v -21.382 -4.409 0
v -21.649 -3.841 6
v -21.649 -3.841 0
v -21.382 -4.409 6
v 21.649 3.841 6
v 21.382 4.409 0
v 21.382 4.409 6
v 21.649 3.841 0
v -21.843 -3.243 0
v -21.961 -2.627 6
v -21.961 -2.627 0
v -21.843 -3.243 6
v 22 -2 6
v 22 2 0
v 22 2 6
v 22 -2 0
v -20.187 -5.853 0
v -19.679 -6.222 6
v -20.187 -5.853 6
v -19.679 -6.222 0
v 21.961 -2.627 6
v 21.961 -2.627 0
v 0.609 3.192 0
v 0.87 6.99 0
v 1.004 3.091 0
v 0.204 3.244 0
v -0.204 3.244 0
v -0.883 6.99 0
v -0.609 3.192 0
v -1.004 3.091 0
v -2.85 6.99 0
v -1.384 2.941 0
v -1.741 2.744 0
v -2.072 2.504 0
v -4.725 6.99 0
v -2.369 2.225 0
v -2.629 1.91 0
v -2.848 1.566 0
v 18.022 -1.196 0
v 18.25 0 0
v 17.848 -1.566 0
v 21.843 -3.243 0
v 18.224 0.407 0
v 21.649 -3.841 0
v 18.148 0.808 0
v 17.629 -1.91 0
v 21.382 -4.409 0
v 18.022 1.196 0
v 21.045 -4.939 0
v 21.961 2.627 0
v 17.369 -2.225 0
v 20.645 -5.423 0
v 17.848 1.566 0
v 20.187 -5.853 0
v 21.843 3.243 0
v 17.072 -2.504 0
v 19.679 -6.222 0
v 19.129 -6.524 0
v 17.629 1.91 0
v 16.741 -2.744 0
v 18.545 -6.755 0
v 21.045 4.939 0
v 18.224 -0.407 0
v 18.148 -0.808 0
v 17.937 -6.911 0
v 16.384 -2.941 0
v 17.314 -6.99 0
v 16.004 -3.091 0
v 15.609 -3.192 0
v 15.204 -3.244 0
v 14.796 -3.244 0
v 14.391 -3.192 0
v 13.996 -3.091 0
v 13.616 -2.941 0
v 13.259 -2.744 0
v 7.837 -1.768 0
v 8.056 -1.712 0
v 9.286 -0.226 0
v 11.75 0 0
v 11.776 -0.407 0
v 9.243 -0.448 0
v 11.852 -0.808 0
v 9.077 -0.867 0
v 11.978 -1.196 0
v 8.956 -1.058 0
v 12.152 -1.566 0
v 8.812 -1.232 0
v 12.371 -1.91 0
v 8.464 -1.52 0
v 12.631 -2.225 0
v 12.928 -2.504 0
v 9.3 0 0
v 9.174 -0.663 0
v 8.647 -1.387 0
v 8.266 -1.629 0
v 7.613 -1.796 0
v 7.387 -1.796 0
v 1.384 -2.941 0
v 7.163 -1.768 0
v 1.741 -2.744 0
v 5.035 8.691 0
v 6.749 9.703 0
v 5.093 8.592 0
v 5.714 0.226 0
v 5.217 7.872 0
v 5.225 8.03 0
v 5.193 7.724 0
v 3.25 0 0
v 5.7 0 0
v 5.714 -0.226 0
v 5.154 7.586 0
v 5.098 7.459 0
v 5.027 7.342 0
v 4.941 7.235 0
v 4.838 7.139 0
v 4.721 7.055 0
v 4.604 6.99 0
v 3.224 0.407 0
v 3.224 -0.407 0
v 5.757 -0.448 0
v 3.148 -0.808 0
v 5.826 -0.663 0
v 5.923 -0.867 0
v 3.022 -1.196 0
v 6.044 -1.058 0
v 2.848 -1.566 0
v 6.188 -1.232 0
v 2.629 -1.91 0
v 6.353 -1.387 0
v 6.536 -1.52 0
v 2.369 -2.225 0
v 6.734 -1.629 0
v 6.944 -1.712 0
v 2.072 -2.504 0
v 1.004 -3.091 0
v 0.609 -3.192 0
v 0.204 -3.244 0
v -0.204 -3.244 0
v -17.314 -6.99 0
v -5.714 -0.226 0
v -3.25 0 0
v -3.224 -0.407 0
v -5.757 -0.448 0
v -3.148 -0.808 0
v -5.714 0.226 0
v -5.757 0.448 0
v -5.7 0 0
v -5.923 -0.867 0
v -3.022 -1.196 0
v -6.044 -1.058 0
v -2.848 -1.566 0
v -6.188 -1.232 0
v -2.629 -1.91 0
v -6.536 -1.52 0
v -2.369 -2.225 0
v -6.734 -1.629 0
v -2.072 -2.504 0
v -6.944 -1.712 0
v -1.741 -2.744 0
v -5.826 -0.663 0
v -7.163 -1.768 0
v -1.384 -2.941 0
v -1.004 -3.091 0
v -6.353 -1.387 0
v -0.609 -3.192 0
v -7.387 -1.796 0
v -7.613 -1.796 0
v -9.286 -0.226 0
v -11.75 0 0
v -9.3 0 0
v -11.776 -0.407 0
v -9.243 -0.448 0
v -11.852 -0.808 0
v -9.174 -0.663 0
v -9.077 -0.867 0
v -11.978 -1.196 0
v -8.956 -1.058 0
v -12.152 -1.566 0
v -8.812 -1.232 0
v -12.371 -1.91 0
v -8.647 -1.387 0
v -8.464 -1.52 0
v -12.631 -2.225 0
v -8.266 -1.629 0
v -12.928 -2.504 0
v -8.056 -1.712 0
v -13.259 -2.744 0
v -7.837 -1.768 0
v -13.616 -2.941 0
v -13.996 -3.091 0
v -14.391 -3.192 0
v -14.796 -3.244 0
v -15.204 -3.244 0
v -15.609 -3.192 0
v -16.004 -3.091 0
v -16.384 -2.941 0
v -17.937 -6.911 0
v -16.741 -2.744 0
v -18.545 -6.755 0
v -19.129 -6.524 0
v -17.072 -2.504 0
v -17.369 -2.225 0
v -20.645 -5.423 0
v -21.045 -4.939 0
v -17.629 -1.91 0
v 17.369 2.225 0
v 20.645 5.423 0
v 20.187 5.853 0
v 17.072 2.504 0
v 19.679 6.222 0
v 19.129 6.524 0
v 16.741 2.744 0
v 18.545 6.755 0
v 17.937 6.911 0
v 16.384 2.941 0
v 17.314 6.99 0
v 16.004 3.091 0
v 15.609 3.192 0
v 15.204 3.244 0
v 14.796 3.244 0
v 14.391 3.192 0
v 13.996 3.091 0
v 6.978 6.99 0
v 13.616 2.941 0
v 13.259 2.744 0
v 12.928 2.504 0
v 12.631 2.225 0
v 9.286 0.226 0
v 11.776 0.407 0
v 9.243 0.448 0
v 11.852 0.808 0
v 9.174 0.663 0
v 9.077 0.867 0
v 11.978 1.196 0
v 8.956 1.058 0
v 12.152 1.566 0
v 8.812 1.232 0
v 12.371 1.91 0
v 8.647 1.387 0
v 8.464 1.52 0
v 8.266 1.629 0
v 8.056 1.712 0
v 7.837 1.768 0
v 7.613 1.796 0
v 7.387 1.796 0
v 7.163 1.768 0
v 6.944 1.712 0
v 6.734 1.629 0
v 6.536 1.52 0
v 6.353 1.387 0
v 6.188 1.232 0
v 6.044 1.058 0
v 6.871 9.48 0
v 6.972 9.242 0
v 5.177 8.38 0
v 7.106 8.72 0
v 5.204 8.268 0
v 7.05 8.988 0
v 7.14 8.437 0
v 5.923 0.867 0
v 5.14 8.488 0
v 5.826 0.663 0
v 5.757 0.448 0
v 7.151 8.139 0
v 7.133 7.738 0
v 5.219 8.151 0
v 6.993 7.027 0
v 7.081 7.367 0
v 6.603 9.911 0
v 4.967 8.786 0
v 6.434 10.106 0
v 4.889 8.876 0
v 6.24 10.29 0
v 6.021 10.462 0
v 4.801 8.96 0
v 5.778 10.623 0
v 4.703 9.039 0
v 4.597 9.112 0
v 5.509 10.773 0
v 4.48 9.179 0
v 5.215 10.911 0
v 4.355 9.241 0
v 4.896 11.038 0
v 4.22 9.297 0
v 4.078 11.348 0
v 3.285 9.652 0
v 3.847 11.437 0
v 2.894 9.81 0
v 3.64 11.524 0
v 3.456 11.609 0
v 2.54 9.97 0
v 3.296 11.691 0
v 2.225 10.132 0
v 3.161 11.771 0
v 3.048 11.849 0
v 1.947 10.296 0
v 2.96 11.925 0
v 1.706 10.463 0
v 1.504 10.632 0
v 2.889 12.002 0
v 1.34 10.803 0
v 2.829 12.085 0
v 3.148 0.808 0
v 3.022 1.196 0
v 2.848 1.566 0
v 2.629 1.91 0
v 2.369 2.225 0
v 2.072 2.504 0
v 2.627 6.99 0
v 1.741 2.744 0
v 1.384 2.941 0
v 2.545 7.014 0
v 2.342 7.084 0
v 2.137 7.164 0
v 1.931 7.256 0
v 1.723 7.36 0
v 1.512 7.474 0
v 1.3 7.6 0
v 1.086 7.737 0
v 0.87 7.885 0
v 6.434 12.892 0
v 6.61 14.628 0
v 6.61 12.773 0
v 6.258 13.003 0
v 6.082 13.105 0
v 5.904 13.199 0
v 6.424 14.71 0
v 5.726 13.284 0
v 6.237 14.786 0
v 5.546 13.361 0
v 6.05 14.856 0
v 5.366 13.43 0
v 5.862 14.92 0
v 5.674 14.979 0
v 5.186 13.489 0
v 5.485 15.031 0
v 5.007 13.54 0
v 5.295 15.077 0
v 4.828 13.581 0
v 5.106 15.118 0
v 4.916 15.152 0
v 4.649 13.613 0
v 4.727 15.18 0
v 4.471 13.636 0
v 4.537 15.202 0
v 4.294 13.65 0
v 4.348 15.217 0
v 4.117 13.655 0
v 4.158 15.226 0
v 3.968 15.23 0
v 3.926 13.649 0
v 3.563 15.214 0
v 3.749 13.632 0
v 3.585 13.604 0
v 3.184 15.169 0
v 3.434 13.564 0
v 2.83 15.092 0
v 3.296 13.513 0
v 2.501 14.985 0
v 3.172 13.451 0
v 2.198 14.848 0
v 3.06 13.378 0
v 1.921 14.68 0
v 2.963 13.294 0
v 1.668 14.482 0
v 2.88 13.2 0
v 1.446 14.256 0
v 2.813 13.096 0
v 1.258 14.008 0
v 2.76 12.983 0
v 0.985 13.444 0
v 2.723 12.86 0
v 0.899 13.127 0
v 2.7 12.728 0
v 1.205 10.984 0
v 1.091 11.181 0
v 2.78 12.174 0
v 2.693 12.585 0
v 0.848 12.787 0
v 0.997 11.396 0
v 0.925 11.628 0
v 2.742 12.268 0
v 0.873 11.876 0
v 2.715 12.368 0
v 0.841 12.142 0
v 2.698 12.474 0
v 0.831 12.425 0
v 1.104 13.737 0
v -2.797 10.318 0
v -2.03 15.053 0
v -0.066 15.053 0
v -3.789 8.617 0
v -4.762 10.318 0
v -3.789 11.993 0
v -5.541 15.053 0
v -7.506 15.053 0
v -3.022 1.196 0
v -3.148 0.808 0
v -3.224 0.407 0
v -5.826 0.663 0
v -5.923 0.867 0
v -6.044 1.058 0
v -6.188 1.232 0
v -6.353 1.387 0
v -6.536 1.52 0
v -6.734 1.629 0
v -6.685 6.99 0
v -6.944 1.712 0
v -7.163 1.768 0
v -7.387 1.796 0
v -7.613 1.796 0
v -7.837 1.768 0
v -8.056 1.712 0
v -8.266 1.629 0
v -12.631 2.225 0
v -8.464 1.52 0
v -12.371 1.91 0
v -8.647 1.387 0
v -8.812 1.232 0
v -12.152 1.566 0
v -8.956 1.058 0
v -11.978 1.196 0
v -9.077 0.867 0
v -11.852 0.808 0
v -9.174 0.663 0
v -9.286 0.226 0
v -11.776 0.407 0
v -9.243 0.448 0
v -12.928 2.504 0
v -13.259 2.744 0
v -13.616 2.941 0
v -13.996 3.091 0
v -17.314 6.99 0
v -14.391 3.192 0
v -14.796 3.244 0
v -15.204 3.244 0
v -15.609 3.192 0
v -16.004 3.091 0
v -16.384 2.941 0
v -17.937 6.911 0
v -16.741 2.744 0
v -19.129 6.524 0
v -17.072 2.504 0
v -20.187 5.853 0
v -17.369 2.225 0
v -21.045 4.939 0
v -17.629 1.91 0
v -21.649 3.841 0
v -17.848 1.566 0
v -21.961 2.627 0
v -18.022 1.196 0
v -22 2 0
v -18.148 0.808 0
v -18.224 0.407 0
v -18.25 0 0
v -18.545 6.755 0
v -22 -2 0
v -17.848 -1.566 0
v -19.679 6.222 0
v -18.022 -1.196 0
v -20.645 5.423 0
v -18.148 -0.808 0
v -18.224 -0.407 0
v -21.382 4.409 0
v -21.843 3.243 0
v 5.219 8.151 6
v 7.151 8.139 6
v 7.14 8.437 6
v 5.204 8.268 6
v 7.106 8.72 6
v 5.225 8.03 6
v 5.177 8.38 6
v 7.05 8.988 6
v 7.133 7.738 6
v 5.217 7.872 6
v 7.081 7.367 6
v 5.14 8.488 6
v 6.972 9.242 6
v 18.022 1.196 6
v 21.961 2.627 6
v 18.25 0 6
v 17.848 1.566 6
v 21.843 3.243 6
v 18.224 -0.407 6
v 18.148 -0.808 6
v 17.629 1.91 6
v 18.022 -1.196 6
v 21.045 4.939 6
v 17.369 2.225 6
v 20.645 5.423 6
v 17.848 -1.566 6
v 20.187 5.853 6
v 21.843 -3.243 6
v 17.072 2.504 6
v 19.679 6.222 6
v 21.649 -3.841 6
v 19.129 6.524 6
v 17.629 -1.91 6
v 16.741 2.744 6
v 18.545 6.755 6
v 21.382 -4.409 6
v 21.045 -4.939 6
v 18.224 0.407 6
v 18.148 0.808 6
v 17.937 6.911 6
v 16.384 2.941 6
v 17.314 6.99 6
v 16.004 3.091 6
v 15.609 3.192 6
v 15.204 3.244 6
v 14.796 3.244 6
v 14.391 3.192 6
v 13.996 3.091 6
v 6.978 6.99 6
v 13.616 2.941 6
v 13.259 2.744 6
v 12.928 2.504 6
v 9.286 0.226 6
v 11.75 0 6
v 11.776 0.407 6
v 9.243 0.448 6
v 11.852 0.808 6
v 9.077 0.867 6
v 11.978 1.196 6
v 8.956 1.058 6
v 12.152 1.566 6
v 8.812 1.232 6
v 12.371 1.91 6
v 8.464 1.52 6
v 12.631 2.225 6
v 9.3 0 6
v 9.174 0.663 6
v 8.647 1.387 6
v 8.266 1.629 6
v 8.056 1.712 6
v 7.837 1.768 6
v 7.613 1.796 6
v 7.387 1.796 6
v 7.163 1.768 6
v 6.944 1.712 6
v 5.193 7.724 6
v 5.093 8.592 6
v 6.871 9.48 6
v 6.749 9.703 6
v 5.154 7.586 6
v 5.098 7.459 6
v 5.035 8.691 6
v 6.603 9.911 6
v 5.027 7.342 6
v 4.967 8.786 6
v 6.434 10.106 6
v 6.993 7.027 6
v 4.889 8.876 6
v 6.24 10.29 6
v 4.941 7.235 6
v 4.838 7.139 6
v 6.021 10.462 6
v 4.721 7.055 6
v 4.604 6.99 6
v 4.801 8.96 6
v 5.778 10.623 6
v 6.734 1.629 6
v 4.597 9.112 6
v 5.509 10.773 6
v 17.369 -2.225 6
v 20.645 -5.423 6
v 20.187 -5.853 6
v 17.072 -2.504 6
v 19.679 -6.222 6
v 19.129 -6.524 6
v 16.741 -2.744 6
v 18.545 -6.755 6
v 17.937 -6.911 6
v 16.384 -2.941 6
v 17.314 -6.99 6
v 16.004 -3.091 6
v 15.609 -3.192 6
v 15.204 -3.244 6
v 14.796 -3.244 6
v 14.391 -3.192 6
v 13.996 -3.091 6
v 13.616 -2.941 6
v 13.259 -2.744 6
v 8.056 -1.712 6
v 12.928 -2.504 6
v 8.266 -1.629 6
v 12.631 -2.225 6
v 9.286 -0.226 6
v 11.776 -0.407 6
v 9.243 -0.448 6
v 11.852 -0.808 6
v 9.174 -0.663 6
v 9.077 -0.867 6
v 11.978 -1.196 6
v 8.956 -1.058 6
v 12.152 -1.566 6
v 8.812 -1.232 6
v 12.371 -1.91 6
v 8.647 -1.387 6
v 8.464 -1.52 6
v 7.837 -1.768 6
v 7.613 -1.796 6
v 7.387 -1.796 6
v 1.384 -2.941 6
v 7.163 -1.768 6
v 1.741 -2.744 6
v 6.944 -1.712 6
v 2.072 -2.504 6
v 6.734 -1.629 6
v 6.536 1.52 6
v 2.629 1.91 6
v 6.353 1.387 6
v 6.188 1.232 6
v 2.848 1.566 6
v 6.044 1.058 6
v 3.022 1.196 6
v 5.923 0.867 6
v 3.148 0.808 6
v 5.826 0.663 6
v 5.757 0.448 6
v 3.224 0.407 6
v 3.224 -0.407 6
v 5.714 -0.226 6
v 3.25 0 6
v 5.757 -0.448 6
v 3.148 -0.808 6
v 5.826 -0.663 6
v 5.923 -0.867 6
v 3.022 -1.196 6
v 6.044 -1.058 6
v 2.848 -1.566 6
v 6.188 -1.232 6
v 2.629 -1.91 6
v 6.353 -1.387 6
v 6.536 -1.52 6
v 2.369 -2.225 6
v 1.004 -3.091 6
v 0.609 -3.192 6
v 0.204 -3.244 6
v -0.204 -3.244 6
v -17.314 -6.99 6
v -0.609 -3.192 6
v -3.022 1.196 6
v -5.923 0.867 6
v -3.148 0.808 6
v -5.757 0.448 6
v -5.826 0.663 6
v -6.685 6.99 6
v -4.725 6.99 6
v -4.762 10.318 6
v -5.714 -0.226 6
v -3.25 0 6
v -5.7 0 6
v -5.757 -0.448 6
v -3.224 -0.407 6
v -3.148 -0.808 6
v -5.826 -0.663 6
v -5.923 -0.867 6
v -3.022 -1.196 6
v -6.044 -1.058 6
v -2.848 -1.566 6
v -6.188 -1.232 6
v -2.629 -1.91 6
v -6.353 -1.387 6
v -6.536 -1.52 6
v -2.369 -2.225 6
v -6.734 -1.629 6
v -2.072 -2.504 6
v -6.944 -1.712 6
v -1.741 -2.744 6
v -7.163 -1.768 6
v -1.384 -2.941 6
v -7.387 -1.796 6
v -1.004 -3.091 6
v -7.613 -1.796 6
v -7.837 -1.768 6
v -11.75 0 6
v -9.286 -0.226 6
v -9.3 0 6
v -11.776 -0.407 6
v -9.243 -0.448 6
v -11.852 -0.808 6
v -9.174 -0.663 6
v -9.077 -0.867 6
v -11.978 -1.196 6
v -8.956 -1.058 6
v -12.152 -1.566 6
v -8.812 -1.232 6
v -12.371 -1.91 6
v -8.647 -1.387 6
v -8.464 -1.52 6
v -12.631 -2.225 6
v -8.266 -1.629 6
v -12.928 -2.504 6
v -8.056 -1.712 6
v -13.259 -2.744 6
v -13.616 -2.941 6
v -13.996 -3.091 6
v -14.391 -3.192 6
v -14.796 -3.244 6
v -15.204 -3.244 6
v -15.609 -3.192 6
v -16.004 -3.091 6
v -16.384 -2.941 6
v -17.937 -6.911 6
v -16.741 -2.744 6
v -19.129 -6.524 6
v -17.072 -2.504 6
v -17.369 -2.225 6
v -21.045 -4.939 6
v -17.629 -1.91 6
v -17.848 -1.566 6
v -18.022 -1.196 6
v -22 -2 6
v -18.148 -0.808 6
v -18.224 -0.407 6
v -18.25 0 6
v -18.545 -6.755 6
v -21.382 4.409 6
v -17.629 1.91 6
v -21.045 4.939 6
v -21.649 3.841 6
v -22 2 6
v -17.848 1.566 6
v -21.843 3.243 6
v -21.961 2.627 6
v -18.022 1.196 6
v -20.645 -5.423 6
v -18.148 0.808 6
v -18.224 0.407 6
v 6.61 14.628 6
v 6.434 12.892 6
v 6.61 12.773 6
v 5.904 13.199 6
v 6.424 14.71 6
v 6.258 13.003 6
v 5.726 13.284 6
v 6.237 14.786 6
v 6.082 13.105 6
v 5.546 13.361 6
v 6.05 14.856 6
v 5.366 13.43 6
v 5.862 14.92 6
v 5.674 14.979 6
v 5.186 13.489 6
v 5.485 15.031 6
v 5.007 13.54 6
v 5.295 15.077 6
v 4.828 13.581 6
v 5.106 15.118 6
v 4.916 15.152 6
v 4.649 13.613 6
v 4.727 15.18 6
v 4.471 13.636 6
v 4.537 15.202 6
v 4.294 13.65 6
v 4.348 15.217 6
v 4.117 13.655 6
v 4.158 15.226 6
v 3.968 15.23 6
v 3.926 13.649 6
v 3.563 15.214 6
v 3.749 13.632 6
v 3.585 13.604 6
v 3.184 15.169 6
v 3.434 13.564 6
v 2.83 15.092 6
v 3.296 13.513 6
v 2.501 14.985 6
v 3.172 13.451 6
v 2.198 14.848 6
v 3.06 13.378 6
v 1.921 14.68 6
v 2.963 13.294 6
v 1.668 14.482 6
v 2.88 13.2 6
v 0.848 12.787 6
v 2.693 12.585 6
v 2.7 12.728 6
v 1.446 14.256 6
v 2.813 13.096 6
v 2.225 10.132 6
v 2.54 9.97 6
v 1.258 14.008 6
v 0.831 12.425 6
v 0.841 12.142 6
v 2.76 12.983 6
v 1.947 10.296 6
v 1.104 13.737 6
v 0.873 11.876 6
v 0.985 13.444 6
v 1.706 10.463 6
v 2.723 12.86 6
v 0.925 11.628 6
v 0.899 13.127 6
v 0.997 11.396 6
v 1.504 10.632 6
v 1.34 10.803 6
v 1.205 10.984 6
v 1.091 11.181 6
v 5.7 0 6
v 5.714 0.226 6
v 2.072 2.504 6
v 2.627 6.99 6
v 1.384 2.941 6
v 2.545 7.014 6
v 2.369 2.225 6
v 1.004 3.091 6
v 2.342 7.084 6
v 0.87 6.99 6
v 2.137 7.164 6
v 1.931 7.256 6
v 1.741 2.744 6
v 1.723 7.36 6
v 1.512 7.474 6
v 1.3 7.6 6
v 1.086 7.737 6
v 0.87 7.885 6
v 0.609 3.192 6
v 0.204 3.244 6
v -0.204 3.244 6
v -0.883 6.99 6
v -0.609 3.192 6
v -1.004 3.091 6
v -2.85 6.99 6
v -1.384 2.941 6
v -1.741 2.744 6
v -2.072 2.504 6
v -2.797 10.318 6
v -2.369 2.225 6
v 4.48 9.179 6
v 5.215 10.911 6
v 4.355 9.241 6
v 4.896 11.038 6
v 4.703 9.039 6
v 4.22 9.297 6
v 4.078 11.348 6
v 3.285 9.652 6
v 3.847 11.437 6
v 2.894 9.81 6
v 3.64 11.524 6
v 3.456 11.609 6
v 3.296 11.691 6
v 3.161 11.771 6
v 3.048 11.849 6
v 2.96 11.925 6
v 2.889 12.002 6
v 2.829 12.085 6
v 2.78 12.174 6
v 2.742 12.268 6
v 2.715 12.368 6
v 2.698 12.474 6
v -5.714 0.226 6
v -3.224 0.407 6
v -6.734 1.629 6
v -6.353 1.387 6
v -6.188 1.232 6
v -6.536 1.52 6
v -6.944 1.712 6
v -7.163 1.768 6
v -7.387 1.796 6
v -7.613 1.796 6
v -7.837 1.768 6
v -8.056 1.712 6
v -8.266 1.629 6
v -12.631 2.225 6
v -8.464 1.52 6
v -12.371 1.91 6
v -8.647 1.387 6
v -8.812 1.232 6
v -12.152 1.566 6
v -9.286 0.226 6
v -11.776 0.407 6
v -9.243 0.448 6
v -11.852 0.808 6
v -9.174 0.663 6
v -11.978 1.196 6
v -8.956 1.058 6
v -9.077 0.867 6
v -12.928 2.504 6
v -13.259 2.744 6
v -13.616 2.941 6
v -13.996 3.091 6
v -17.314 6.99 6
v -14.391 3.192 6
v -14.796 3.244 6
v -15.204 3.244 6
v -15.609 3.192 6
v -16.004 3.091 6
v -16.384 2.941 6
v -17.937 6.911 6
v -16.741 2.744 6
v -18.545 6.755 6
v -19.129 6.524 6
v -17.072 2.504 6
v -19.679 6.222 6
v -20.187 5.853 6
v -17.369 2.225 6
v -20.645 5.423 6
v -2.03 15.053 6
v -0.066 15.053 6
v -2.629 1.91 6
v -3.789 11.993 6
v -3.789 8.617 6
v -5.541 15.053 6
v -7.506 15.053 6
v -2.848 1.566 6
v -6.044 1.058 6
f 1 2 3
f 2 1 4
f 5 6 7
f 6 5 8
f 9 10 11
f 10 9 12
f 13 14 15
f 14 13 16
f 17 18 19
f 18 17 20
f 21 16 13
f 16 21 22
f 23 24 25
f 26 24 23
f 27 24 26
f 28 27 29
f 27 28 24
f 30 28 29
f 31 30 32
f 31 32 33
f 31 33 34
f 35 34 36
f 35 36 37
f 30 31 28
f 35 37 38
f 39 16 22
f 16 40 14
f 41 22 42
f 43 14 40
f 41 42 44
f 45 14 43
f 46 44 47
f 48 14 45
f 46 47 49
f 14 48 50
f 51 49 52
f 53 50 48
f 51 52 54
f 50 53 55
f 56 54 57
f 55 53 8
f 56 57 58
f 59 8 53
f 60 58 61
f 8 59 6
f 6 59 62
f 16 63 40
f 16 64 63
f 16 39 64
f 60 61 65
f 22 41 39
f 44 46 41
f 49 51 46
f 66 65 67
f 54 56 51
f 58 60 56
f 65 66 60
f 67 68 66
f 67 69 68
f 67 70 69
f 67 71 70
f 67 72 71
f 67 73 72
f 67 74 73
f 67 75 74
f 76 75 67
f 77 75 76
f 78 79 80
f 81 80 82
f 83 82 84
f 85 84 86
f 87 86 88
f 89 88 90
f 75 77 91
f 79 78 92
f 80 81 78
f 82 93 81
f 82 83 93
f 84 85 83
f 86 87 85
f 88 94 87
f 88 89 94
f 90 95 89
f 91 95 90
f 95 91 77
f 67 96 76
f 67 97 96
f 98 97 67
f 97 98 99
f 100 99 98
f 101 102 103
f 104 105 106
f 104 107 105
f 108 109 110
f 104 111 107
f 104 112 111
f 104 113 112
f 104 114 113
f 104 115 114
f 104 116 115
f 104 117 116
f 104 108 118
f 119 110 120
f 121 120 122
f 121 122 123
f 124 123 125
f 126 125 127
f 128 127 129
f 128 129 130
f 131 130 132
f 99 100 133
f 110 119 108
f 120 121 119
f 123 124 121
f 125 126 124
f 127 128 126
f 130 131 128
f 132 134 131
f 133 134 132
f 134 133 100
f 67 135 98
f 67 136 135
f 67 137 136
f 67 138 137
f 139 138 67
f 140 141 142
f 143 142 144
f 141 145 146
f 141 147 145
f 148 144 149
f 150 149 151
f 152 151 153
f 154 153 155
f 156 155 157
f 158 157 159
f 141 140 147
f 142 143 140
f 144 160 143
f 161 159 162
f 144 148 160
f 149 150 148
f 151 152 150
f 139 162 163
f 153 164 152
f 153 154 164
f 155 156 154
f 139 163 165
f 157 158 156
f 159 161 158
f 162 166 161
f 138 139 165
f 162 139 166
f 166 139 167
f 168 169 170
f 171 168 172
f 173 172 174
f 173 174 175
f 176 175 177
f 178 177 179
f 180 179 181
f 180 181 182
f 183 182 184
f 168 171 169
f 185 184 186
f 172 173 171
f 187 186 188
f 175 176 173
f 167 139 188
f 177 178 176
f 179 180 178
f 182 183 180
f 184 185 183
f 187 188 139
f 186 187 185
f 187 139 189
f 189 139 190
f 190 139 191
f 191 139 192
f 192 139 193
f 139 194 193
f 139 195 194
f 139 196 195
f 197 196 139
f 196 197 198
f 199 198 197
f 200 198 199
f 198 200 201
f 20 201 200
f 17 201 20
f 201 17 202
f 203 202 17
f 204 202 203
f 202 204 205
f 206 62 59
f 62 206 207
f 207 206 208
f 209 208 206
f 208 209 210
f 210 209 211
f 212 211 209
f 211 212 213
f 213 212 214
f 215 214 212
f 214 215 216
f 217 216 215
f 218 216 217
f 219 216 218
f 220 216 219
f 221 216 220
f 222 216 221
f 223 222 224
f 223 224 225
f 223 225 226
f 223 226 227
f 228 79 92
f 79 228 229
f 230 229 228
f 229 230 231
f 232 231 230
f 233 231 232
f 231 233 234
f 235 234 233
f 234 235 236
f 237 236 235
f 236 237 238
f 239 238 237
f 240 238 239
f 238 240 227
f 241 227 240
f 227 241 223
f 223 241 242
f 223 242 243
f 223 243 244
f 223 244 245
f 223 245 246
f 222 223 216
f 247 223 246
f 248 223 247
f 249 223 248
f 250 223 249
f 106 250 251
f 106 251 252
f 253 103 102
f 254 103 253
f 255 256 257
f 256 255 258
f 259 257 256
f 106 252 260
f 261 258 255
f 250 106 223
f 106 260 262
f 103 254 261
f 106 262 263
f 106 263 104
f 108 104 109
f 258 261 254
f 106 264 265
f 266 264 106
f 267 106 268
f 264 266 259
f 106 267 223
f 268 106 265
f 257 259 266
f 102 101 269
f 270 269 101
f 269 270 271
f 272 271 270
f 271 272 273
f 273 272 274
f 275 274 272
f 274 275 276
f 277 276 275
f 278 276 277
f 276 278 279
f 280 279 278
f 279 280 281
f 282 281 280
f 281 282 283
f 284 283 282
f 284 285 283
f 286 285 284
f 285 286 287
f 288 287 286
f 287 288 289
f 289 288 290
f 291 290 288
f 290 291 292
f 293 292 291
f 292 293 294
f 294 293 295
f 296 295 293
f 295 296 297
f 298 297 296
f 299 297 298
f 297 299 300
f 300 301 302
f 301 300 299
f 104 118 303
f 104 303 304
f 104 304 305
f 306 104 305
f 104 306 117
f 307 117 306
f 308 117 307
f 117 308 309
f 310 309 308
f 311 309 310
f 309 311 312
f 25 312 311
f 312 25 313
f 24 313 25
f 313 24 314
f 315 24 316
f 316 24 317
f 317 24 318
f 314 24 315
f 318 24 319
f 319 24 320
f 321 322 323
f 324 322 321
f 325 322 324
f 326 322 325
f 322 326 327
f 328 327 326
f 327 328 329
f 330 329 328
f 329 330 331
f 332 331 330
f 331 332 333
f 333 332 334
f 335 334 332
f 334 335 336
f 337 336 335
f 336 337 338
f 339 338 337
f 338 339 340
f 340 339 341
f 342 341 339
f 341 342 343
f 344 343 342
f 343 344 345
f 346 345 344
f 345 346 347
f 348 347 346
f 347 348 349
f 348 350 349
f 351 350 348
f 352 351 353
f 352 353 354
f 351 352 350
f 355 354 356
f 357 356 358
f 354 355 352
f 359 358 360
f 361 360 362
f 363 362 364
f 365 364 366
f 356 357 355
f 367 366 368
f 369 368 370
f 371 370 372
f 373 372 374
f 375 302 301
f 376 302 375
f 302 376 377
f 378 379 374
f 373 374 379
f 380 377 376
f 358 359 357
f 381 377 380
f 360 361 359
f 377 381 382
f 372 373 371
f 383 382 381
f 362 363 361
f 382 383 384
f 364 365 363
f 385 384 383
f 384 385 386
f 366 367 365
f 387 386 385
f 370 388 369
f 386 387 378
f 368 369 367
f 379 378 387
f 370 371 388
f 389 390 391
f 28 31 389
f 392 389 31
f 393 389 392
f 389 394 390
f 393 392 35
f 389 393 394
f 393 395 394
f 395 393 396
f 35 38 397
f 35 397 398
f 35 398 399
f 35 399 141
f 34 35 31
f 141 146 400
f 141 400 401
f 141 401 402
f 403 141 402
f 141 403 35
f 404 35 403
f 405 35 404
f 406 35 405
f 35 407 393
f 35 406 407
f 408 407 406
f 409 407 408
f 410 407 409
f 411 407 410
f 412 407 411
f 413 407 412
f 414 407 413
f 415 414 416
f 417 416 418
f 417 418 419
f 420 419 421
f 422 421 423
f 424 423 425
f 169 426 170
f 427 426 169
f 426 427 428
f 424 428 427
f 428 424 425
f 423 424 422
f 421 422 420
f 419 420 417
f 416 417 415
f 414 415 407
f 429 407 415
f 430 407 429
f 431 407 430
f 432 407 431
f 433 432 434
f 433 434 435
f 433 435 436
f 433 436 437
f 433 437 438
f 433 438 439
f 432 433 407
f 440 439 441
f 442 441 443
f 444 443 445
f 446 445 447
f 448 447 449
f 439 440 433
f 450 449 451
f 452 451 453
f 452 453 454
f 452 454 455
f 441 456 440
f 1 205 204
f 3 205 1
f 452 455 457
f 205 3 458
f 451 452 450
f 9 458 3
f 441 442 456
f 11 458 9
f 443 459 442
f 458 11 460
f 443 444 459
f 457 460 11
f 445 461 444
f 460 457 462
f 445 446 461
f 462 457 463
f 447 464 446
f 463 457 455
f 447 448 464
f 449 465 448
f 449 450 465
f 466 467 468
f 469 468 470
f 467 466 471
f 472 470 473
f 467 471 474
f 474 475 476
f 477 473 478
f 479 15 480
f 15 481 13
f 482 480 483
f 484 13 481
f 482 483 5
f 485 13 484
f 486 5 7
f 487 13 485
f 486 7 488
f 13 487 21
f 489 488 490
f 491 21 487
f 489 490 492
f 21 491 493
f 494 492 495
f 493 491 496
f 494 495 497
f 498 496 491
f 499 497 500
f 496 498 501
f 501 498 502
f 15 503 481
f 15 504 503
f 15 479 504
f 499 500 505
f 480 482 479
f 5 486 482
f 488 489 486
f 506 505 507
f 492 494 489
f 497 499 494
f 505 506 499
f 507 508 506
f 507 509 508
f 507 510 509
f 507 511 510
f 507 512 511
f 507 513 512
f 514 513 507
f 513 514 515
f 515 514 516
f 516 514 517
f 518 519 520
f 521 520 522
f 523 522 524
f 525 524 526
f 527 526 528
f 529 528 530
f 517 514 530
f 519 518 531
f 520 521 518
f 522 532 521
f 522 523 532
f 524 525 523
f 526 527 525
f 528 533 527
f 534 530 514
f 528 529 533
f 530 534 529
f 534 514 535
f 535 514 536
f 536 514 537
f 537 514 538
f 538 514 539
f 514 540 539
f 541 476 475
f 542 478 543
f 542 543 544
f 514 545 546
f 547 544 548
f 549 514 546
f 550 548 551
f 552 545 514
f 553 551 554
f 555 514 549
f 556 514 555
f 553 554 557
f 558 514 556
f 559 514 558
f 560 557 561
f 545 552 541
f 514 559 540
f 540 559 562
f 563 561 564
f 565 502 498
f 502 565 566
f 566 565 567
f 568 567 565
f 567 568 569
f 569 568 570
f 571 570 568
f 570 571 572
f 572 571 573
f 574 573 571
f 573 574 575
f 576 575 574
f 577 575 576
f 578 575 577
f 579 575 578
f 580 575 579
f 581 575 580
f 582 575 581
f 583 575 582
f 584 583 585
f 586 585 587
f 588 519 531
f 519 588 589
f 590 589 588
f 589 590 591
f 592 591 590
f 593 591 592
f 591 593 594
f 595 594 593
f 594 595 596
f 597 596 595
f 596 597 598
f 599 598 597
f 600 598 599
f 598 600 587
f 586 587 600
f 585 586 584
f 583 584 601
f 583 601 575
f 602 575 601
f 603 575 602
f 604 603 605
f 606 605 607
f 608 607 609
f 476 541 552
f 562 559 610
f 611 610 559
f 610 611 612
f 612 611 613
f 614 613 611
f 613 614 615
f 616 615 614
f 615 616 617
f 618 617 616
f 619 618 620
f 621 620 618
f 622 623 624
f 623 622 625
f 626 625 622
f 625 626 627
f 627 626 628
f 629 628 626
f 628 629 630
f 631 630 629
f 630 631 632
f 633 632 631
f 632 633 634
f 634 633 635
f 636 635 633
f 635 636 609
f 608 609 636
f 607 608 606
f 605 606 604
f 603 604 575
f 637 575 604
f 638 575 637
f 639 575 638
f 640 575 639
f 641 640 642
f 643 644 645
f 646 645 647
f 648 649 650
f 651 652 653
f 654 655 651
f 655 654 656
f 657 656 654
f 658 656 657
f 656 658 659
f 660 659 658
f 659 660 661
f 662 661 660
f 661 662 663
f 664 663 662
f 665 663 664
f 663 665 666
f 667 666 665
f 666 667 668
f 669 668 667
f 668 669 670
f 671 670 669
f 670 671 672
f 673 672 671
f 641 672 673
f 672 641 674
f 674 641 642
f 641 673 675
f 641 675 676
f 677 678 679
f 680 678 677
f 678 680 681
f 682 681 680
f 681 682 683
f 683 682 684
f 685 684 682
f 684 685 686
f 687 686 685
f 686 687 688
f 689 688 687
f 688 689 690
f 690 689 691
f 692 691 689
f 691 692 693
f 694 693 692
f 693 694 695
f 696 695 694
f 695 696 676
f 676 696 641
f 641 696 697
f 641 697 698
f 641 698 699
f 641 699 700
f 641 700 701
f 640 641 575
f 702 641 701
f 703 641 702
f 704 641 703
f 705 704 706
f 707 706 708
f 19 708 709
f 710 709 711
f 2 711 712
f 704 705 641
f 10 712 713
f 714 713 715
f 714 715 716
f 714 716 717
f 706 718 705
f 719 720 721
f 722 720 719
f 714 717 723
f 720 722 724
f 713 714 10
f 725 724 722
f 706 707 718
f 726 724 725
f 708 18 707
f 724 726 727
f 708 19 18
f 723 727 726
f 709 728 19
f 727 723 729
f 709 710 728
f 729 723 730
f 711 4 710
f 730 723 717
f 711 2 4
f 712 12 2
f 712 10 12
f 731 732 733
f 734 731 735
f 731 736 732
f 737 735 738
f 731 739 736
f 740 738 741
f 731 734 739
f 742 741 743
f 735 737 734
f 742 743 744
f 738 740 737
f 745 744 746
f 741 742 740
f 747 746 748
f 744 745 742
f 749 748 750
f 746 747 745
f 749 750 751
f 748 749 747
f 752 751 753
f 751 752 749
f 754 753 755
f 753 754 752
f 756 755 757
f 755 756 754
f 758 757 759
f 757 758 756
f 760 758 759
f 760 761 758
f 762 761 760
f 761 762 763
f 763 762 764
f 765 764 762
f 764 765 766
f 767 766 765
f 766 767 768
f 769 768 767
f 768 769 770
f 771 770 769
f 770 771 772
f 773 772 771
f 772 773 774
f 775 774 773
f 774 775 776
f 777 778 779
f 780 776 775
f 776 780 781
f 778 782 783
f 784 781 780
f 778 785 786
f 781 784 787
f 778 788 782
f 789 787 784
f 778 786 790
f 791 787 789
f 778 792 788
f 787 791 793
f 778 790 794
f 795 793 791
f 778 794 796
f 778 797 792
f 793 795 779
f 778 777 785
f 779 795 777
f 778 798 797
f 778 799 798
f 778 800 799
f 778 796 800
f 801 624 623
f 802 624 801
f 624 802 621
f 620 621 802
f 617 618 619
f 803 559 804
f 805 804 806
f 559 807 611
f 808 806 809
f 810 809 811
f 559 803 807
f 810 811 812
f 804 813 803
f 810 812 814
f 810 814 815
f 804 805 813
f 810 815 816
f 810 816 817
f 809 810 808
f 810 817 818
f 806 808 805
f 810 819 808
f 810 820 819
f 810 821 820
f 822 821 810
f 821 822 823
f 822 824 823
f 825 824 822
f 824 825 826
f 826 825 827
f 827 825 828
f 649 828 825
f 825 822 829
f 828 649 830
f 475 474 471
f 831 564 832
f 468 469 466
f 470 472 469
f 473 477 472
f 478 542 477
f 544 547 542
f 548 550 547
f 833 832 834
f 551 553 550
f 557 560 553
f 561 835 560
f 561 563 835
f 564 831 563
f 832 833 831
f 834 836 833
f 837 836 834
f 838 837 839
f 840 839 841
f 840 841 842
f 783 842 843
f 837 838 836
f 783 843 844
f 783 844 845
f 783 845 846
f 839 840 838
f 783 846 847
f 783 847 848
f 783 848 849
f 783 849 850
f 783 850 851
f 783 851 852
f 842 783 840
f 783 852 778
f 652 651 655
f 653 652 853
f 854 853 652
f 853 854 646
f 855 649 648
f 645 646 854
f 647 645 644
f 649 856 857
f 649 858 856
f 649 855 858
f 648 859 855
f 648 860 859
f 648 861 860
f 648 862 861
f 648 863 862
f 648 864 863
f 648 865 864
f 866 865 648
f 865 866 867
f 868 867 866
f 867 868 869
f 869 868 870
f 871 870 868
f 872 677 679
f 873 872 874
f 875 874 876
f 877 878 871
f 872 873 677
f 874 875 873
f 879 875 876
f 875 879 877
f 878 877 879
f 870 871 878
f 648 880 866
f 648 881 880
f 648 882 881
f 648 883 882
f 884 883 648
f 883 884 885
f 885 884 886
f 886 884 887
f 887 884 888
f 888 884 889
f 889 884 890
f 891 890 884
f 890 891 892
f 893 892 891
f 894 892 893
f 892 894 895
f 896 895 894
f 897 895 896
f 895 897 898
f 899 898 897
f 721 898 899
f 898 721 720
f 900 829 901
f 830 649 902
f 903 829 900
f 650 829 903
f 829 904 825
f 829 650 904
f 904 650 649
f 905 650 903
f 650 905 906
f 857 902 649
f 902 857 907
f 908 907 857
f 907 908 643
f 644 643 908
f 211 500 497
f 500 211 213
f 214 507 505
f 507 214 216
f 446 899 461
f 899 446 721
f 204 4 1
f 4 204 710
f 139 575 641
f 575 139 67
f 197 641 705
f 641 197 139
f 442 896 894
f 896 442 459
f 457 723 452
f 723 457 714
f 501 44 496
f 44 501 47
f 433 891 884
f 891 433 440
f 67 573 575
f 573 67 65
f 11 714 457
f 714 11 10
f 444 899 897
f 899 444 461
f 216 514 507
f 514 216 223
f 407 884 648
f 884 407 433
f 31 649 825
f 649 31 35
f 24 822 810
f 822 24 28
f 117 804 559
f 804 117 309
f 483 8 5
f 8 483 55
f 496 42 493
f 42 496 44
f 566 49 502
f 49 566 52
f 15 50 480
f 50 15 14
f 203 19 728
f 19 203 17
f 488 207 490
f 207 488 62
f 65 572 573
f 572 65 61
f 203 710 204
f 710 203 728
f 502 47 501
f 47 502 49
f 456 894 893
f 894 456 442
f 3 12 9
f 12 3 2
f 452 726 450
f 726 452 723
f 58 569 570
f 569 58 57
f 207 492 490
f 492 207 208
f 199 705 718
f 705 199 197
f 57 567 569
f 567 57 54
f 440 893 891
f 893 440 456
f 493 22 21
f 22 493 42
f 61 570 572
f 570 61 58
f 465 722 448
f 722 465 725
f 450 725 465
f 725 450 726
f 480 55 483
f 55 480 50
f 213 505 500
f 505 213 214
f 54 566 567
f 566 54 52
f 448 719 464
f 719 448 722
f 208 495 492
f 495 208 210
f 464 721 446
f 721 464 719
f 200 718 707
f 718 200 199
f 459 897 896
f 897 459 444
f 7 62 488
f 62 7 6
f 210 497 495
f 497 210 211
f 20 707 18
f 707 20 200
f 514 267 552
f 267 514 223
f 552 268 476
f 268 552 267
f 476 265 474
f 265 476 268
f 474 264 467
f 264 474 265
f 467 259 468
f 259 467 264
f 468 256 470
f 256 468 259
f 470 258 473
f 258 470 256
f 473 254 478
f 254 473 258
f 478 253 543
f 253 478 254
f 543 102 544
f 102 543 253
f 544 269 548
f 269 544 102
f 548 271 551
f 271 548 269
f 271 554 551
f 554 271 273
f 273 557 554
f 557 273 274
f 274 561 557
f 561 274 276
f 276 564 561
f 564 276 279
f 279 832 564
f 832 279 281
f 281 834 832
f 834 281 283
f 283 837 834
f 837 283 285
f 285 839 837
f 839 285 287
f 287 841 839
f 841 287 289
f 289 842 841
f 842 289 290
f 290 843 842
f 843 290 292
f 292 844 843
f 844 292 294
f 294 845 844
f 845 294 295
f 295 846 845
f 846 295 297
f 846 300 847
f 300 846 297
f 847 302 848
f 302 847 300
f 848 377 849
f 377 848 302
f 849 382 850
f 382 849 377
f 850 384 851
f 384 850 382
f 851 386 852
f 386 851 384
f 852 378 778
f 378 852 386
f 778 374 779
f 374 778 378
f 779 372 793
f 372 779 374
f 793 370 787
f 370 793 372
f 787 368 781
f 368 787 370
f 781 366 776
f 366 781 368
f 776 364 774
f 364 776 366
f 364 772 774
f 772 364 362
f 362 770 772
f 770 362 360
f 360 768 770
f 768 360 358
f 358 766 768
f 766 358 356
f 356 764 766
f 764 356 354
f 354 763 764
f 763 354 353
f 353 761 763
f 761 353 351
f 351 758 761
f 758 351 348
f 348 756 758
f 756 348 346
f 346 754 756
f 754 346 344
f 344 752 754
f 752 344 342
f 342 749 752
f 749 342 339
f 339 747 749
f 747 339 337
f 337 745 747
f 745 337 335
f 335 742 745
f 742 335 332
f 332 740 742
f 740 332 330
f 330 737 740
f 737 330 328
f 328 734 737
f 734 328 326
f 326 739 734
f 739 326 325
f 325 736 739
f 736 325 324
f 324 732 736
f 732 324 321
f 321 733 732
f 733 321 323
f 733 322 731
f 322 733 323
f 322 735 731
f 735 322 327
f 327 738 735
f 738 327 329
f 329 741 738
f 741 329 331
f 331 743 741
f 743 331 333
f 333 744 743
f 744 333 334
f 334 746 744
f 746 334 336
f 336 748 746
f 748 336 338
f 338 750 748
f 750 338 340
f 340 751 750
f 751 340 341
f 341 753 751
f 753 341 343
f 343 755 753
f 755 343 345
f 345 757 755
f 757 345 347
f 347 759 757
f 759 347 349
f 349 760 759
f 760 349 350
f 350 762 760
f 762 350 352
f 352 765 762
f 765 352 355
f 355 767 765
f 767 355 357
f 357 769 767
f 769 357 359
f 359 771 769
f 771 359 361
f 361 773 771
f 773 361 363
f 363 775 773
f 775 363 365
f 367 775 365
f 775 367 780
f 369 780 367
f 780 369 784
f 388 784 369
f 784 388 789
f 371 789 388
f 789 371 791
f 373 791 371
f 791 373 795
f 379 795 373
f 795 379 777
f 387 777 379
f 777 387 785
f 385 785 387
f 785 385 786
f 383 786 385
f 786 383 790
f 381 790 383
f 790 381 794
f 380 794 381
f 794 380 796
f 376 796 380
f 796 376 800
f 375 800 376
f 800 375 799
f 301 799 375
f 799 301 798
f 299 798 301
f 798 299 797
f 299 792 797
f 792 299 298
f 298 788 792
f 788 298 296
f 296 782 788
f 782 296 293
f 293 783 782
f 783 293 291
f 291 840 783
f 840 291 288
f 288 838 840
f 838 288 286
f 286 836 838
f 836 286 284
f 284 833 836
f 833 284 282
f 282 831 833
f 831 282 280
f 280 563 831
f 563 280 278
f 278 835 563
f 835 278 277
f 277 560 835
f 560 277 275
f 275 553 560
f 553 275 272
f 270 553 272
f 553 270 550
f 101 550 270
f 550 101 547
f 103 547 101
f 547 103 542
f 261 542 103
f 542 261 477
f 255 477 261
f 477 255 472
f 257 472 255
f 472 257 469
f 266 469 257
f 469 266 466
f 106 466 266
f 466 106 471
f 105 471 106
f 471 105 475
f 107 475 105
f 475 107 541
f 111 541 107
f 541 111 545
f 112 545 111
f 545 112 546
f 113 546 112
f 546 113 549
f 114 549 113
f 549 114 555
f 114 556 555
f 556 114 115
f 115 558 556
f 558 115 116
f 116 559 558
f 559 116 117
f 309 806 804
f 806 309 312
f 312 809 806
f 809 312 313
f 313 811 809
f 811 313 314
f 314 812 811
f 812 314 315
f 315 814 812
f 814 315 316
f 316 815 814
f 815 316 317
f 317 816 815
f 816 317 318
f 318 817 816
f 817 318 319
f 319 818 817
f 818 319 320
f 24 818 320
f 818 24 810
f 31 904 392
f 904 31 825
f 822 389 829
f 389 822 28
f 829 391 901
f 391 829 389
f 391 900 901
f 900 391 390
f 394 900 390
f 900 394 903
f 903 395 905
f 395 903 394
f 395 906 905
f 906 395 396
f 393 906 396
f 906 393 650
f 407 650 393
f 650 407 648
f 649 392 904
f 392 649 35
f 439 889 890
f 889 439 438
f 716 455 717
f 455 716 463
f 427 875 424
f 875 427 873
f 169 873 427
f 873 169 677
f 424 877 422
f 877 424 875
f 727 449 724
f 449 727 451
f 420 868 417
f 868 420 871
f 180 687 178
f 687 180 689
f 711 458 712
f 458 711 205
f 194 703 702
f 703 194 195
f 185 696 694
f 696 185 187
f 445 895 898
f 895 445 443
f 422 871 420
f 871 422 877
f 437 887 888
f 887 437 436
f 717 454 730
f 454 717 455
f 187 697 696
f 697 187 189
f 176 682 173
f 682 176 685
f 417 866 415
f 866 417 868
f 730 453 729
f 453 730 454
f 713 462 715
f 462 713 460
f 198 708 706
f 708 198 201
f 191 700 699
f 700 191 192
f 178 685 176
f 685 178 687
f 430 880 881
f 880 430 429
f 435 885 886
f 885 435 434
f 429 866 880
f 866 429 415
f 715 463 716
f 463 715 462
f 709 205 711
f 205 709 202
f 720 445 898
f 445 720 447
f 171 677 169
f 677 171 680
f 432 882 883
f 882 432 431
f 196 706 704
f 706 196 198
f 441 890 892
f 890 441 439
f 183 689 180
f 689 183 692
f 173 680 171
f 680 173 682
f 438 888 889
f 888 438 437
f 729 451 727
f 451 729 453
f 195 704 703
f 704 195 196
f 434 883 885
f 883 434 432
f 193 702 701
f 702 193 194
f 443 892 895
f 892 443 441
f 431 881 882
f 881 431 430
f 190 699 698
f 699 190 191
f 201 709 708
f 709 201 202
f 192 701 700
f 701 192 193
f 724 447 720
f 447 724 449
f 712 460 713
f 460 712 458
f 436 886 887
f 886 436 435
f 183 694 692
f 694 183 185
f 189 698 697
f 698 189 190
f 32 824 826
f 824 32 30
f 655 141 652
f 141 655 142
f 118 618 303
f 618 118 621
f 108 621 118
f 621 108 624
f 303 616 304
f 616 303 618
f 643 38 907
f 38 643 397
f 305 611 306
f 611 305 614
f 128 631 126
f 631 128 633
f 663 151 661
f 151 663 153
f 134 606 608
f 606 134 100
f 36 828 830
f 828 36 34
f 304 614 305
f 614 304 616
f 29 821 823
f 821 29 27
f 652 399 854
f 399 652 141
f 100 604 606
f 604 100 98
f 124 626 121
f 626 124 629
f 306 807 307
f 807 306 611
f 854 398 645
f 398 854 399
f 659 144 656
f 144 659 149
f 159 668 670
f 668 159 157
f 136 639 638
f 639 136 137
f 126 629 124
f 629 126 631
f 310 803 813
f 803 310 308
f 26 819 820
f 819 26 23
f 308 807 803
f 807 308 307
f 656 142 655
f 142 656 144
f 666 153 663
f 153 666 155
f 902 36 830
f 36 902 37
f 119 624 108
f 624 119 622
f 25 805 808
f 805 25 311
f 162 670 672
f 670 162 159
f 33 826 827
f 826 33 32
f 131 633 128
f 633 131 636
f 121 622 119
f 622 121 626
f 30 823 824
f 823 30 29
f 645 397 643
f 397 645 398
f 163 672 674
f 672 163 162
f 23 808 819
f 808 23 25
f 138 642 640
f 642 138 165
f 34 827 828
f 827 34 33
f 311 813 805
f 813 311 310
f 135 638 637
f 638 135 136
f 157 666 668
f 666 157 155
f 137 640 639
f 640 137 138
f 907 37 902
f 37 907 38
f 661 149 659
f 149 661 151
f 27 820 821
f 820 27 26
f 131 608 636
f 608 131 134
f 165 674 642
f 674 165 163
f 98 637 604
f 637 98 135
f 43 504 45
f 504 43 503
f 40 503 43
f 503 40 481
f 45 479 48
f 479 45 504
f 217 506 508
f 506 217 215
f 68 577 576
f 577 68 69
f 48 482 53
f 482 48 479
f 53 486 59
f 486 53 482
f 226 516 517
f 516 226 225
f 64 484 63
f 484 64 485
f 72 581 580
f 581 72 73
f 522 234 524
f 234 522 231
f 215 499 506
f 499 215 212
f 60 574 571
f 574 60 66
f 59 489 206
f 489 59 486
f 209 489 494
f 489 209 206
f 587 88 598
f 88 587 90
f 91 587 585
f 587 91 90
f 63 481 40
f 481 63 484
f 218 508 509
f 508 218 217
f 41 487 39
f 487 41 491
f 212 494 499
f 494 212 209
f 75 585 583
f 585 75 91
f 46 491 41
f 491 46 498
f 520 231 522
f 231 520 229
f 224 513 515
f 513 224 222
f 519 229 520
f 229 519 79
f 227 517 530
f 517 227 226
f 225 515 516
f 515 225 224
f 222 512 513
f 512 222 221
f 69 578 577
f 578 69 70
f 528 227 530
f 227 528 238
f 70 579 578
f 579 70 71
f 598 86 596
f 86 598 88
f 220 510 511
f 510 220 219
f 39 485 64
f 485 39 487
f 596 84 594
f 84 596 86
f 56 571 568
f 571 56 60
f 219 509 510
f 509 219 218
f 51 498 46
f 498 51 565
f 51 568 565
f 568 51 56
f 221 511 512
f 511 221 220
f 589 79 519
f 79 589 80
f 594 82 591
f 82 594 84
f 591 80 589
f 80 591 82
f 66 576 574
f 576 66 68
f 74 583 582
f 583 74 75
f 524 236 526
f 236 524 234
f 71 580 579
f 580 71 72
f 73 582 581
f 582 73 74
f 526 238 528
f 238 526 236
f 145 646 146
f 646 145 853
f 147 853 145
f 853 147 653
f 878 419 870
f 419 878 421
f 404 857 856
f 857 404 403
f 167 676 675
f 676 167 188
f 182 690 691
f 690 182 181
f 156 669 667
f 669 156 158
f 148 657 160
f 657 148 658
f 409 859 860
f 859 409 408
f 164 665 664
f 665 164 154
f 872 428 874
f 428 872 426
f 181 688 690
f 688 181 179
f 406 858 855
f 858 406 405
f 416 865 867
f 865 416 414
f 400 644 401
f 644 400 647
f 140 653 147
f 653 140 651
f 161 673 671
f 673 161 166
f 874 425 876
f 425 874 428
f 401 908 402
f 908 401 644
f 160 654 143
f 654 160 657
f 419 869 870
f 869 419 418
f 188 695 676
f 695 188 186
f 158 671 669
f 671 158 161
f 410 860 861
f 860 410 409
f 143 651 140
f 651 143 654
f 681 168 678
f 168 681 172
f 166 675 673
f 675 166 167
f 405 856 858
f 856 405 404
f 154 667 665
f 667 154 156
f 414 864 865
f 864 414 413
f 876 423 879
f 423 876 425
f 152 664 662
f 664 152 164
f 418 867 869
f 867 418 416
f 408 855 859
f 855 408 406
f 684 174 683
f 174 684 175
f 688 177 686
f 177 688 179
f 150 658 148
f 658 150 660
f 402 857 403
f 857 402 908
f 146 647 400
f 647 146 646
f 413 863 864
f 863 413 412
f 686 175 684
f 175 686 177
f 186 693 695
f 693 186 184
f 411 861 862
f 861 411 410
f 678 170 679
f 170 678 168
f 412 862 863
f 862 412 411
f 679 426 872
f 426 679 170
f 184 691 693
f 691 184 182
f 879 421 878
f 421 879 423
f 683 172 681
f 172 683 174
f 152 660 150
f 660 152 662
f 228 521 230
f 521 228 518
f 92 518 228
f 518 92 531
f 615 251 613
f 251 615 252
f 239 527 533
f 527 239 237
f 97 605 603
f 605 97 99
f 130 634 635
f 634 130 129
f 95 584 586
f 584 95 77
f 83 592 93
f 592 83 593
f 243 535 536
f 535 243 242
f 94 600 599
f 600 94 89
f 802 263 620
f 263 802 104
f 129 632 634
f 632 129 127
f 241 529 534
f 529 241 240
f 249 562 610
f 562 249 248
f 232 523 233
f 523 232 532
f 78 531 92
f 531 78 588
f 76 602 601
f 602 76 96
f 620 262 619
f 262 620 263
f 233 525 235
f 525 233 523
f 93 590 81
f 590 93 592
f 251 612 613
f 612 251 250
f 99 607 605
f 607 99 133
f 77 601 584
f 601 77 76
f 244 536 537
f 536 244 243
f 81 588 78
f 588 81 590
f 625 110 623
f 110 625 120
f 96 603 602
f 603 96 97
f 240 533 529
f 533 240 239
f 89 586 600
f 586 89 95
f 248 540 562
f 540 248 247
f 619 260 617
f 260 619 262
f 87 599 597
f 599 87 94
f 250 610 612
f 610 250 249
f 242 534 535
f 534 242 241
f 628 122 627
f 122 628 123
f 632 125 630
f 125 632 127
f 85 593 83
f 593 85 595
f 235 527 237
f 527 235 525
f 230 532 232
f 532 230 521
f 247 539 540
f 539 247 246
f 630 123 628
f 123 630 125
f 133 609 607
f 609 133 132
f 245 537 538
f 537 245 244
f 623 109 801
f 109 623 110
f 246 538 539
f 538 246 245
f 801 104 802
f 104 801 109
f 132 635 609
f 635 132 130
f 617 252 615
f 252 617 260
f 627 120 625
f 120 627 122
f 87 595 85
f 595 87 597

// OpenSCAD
$fn = 50;


difference() {
	union() {
		hull() {
			translate(v = [-17.0000000000, 2.0000000000, 0]) {
				cylinder(h = 6, r = 5);
			}
			translate(v = [17.0000000000, 2.0000000000, 0]) {
				cylinder(h = 6, r = 5);
			}
			translate(v = [-17.0000000000, -2.0000000000, 0]) {
				cylinder(h = 6, r = 5);
			}
			translate(v = [17.0000000000, -2.0000000000, 0]) {
				cylinder(h = 6, r = 5);
			}
		}
		translate(v = [0, 15.0000000000, 0]) {
			linear_extrude(height = 6) {
				text(font = "DejaVu Sans Mono:style=Bold", halign = "center", size = 9.5000000000, text = "XS", valign = "top");
			}
		}
	}
	union() {
		translate(v = [-15.0000000000, 0.0000000000, 0]) {
			translate(v = [0, 0, -100]) {
				cylinder(h = 200, r = 3.2500000000);
			}
		}
		translate(v = [0, 0, -100]) {
			cylinder(h = 200, r = 3.2500000000);
		}
		translate(v = [15.0000000000, 0.0000000000, 0]) {
			translate(v = [0, 0, -100]) {
				cylinder(h = 200, r = 3.2500000000);
			}
		}
		translate(v = [-15.0000000000, 0.0000000000, 0]) {
			translate(v = [0, 0, -100]) {
				cylinder(h = 200, r = 1.8000000000);
			}
		}
		translate(v = [-7.5000000000, 0.0000000000, 0]) {
			translate(v = [0, 0, -100]) {
				cylinder(h = 200, r = 1.8000000000);
			}
		}
		translate(v = [0, 0, -100]) {
			cylinder(h = 200, r = 1.8000000000);
		}
		translate(v = [7.5000000000, 0.0000000000, 0]) {
			translate(v = [0, 0, -100]) {
				cylinder(h = 200, r = 1.8000000000);
			}
		}
		translate(v = [15.0000000000, 0.0000000000, 0]) {
			translate(v = [0, 0, -100]) {
				cylinder(h = 200, r = 1.8000000000);
			}
		}
	}
}
